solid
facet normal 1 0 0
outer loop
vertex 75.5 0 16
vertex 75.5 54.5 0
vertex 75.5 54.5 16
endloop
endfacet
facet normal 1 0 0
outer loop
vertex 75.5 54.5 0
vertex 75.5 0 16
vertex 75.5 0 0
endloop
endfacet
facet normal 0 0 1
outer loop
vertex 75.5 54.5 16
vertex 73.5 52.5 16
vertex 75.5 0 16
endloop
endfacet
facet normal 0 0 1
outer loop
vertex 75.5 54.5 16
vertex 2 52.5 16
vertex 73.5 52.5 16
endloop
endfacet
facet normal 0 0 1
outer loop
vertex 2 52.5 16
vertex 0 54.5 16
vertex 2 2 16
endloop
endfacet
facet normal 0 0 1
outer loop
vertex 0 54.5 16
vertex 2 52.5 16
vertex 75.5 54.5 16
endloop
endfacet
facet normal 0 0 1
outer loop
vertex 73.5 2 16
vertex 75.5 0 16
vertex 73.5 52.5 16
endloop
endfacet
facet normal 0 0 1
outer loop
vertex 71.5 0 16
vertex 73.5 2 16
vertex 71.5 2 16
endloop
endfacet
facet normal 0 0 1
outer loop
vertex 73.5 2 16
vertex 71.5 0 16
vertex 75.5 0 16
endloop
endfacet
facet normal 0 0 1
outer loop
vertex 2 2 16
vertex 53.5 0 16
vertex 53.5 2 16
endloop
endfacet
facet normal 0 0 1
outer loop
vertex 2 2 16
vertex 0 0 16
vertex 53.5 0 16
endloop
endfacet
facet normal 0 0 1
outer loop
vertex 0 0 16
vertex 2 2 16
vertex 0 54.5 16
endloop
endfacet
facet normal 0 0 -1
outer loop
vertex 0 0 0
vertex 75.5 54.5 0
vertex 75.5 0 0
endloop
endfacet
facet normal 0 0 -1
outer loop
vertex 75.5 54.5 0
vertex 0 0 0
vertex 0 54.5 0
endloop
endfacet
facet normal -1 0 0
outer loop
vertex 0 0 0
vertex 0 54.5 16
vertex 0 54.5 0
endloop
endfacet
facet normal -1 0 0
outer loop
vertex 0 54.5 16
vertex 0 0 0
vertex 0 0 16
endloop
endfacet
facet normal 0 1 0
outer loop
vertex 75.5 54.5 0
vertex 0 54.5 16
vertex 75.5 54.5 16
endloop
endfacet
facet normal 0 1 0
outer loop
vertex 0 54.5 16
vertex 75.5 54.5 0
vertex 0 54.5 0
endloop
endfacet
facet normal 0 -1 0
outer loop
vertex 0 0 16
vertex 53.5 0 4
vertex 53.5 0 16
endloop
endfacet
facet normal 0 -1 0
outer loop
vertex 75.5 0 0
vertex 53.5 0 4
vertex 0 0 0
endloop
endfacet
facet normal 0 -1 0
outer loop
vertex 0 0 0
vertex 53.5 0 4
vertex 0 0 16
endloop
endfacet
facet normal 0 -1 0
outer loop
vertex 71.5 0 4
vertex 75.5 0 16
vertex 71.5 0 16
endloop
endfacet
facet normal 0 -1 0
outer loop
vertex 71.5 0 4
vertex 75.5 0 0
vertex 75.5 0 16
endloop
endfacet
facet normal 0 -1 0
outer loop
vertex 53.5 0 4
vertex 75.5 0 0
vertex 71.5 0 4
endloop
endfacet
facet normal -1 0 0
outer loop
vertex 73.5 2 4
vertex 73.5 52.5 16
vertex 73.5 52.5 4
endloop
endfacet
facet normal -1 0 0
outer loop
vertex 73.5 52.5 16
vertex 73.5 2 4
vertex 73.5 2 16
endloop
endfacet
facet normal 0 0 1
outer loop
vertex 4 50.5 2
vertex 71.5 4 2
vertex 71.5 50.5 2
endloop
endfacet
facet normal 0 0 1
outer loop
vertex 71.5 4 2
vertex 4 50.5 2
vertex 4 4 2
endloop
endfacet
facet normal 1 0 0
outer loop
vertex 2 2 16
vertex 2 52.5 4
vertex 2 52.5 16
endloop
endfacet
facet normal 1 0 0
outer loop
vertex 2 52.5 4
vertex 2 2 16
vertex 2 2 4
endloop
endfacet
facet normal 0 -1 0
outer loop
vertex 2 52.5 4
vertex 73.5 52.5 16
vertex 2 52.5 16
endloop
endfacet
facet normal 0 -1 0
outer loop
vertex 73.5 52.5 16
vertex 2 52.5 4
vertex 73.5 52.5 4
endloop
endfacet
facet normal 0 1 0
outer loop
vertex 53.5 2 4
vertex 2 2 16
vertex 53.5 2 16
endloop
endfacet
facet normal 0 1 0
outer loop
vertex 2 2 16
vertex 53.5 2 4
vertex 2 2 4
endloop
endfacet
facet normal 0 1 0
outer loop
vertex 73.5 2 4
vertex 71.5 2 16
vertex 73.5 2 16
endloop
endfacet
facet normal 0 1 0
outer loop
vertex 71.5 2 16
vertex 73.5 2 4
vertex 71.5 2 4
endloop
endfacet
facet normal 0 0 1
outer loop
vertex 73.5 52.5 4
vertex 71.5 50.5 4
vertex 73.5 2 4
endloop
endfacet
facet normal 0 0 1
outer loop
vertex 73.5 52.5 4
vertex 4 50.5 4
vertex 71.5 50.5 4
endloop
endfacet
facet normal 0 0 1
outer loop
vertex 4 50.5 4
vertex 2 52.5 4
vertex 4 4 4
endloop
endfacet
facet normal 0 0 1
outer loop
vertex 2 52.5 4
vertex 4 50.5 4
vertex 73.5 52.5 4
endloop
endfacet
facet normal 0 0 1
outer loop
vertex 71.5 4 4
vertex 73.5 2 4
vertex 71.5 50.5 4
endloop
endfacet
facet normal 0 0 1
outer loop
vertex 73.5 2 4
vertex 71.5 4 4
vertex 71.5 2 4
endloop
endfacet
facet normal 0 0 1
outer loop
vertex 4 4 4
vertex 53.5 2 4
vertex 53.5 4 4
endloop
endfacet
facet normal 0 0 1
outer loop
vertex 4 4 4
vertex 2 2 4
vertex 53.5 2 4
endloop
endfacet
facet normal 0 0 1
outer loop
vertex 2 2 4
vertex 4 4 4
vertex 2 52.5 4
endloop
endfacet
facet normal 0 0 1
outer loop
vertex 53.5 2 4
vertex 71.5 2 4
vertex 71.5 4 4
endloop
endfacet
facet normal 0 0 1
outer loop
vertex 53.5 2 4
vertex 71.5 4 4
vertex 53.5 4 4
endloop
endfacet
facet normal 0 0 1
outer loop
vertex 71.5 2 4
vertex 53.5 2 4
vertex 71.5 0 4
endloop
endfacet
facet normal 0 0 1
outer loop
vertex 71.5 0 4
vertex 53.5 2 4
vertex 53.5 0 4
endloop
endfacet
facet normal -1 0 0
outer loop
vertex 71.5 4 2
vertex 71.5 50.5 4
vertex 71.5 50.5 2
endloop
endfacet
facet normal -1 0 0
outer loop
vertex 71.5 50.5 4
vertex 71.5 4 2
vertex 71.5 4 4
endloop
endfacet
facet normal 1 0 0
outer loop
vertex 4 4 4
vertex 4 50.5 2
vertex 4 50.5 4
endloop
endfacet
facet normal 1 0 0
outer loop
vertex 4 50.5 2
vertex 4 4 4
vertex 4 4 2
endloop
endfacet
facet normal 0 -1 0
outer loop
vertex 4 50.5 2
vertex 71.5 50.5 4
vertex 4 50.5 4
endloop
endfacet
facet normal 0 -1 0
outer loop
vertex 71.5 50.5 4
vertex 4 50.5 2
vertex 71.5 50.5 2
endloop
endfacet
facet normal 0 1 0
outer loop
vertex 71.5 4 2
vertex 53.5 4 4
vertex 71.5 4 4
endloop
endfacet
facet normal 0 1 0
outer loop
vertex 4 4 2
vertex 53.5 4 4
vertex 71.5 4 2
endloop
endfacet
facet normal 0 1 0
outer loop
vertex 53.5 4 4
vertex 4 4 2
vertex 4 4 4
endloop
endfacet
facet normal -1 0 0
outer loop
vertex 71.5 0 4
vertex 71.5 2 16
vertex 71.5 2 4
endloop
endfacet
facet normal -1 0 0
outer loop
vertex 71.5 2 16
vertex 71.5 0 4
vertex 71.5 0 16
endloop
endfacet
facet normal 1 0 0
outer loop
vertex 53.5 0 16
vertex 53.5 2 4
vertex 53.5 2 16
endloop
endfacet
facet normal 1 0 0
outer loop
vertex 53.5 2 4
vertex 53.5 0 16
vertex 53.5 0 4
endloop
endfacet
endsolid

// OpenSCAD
//*************************************************
// VARIABLES
//*************************************************

// part to generate ( 0: box ; 1: top ; 2: all )
part = 0; // [0:box,1:top,2:all]

// wall thickness
wt = 2;

// lower support (x,y,z) thickness
lss = [ 2, 2, 2 ];

// internal object x,y,z size ( must consider required margins )
is = [ 71.5, 50.5, 10 ];

// object count
oc = 1;

// top interlock margin
tim = .5;

// top grid airflow ( >0 to enable or 0 to disable )
tg = 0;

// top grid airflow wall thickness
tgwt = 5;

// hole (width, height, xcenter, xcenter_percent, zbottom)
// notes: if xcenter_percent true when pos represent position 0..1 inside
// zbottom is the distance from bottom to the begin of hole

// left holes ( array of [width, height, xcenter, xcenter_percent, zbottom] )
lh = [];

// right holes ( array of [width, height, xcenter, xcenter_percent, zbottom] )
rh = [];

// front holes ( array of [width, height, xcenter, xcenter_percent, zbottom] )
fh = [ [ 18, 12, 60.5, false, wt + lss[2] ] ];

// bottom holes ( array of [width, height, xcenter, xcenter_percent, zbottom] )
bh = [];
//bh = fh;

//*************************************************
//
//*************************************************

// total size
ts = [
    wt + oc * ( is[0] + wt ),
    is[1] + 2 * wt,
    wt + lss[2] + is[2] + 2 * wt
];

someholes = (len(lh) + len(rh) + len(fh) + len(bh)) > 0;

//======================================
// part: 0 ( BOX and HOLES )
//======================================
module box()
{
    wt3 = [wt, wt, wt];
    
    // box size
    bs = [ ts[0], ts[1], ts[2] - wt ];
    
    color("DarkGray", alpha=.5)
    {
        union()
        {    

            // main box
            difference()
            {
                cube(bs);
                translate(wt3)
                    cube([ts[0] - 2 * wt, bs[1] - 2 * wt, bs[2]]);
            }
            
            // pcb support
            translate(wt3)
            {
                difference()
                {
                    cube([
                        bs[0] - 2 * wt,
                        bs[1] - 2 * wt,
                        lss[2]
                    ]);
                    translate([lss[0], lss[1], 0])
                        cube([
                            bs[0] - 2 * wt - 2 * lss[0],
                            bs[1] - 2 * wt - 2 * lss[1],
                            lss[2]
                        ]);
                }
            }
            
            // objs sep walls with lower support
            if (oc > 1)
            {
                for (i = [1:oc-1])
                {
                    // wall
                    translate([i * (wt + is[0]), 0, 0])
                        cube([wt, bs[1], wt + lss[2] + is[2]]);
                    
                    // near support
                    translate([i * (wt + is[0]) - lss[0], 0, wt])        
                        cube([lss[0], bs[1], lss[2]]);
                    
                    // far support
                    translate([i * (wt + is[0]) + wt, 0, wt])        
                        cube([lss[0], bs[1], lss[2]]);
                }
            }
        }
    }
}

module holes()
{
    // front holes
    if (len(fh) > 0)
    {
        for (i = [0 : len(fh)-1])
        {    
            hole = fh[i];        
            
            w = hole[0];
            h = hole[1];        
            
            xpos = wt + i * (is[0] + wt) + 
                (hole[3] ? is[0] * hole[2] : hole[2]) - w/2;
            zpos = hole[4];
                    
            translate([xpos, 0, zpos])
                cube([w, wt + lss[1], h]);                
        }
    }
    
    // back holes
    if (len(bh) > 0)
    {
        for (i = [0 : len(bh)-1])
        {    
            hole = bh[i];        
            
            w = hole[0];
            h = hole[1];        
            
            xpos = wt + i * (is[0] + wt) + 
                (hole[3] ? is[0] * hole[2] : hole[2]) - w/2;
            zpos = hole[4];
                    
            translate([xpos, ts[1] - wt - lss[1], zpos])
                cube([w, wt + lss[1], h]);                
        }
    }
    
    // left holes
    if (len(lh) > 0)
    {
        for (i = [0 : len(lh)-1])
        {    
            hole = lh[i];                
            
            w = hole[0];
            h = hole[1];        
            
            ypos = wt + 
                (hole[3] ? is[1] * hole[2] : hole[2]) - w/2;
            zpos = hole[4];
                    
            translate([0, ypos, zpos])
                cube([wt + lss[1], w, h]);                
        }
    }
    
    // right holes
    if (len(rh) > 0)
    {
        for (i = [0 : len(rh)-1])
        {    
            hole = rh[i];                
            
            w = hole[0];
            h = hole[1];        
            
            ypos = wt + 
                (hole[3] ? is[1] * hole[2] : hole[2]) - w/2;
            zpos = hole[4];
                    
            translate([ts[0] - wt - lss[1], ypos, zpos])
                cube([wt + lss[1], w, h]);                
        }
    }
}

if (part == 0 || part == 2)
{
    difference()
    {
        box();
        if (someholes) holes();
    }
}

//======================================
// part: 1 ( TOP )
//======================================
module topGrid()
{
    if (tg > 0)
    {                
        // avx,y space after required margin
        avx = ts[0] - 4 * wt;
        avy = ts[1] - 4 * wt;
        
        dimx = tg + tgwt;
        dimy = tg + tgwt;
                                
        kx = floor(avx / dimx);
        offx = (ts[0] - kx * dimx) / 2 + tgwt / 2;
                
        ky = floor(avy / dimy);
        offy = (ts[1] - ky * dimy) / 2 + tgwt / 2;
        
        echo(ts[0]/oc);
        
        for (ix = [0:kx-1])
        {
            for (iy = [0:ky-1])
            {                                                
                tx = offx + ix * dimx;
                ty = offy + iy * dimy;
                
                if ((tx + dimx/2) % (ts[0]/oc) > wt + dimx/2)
                {                
                    translate([tx, ty, ts[2] - 2 * wt])
                        cube([tg, tg, 2 * wt]);
                }
            }
        }
    }
}

module top_()
{
    color("Coral", alpha=.5)    
    {
        // top
        translate([0, 0, ts[2]-wt])
            cube([ts[0], ts[1], wt]);
        
        // top interlock
        translate([wt + tim, wt + tim, ts[2] - 2 * wt])
            cube([ts[0] - 2 * wt - 2 * tim, ts[1] - 2 * wt - 2 * tim, wt]);
    }
}

module top()
{
    difference()
    {
        top_();
        topGrid();
    }    
}
if (part == 1 || part == 2)
{
    top();
}
